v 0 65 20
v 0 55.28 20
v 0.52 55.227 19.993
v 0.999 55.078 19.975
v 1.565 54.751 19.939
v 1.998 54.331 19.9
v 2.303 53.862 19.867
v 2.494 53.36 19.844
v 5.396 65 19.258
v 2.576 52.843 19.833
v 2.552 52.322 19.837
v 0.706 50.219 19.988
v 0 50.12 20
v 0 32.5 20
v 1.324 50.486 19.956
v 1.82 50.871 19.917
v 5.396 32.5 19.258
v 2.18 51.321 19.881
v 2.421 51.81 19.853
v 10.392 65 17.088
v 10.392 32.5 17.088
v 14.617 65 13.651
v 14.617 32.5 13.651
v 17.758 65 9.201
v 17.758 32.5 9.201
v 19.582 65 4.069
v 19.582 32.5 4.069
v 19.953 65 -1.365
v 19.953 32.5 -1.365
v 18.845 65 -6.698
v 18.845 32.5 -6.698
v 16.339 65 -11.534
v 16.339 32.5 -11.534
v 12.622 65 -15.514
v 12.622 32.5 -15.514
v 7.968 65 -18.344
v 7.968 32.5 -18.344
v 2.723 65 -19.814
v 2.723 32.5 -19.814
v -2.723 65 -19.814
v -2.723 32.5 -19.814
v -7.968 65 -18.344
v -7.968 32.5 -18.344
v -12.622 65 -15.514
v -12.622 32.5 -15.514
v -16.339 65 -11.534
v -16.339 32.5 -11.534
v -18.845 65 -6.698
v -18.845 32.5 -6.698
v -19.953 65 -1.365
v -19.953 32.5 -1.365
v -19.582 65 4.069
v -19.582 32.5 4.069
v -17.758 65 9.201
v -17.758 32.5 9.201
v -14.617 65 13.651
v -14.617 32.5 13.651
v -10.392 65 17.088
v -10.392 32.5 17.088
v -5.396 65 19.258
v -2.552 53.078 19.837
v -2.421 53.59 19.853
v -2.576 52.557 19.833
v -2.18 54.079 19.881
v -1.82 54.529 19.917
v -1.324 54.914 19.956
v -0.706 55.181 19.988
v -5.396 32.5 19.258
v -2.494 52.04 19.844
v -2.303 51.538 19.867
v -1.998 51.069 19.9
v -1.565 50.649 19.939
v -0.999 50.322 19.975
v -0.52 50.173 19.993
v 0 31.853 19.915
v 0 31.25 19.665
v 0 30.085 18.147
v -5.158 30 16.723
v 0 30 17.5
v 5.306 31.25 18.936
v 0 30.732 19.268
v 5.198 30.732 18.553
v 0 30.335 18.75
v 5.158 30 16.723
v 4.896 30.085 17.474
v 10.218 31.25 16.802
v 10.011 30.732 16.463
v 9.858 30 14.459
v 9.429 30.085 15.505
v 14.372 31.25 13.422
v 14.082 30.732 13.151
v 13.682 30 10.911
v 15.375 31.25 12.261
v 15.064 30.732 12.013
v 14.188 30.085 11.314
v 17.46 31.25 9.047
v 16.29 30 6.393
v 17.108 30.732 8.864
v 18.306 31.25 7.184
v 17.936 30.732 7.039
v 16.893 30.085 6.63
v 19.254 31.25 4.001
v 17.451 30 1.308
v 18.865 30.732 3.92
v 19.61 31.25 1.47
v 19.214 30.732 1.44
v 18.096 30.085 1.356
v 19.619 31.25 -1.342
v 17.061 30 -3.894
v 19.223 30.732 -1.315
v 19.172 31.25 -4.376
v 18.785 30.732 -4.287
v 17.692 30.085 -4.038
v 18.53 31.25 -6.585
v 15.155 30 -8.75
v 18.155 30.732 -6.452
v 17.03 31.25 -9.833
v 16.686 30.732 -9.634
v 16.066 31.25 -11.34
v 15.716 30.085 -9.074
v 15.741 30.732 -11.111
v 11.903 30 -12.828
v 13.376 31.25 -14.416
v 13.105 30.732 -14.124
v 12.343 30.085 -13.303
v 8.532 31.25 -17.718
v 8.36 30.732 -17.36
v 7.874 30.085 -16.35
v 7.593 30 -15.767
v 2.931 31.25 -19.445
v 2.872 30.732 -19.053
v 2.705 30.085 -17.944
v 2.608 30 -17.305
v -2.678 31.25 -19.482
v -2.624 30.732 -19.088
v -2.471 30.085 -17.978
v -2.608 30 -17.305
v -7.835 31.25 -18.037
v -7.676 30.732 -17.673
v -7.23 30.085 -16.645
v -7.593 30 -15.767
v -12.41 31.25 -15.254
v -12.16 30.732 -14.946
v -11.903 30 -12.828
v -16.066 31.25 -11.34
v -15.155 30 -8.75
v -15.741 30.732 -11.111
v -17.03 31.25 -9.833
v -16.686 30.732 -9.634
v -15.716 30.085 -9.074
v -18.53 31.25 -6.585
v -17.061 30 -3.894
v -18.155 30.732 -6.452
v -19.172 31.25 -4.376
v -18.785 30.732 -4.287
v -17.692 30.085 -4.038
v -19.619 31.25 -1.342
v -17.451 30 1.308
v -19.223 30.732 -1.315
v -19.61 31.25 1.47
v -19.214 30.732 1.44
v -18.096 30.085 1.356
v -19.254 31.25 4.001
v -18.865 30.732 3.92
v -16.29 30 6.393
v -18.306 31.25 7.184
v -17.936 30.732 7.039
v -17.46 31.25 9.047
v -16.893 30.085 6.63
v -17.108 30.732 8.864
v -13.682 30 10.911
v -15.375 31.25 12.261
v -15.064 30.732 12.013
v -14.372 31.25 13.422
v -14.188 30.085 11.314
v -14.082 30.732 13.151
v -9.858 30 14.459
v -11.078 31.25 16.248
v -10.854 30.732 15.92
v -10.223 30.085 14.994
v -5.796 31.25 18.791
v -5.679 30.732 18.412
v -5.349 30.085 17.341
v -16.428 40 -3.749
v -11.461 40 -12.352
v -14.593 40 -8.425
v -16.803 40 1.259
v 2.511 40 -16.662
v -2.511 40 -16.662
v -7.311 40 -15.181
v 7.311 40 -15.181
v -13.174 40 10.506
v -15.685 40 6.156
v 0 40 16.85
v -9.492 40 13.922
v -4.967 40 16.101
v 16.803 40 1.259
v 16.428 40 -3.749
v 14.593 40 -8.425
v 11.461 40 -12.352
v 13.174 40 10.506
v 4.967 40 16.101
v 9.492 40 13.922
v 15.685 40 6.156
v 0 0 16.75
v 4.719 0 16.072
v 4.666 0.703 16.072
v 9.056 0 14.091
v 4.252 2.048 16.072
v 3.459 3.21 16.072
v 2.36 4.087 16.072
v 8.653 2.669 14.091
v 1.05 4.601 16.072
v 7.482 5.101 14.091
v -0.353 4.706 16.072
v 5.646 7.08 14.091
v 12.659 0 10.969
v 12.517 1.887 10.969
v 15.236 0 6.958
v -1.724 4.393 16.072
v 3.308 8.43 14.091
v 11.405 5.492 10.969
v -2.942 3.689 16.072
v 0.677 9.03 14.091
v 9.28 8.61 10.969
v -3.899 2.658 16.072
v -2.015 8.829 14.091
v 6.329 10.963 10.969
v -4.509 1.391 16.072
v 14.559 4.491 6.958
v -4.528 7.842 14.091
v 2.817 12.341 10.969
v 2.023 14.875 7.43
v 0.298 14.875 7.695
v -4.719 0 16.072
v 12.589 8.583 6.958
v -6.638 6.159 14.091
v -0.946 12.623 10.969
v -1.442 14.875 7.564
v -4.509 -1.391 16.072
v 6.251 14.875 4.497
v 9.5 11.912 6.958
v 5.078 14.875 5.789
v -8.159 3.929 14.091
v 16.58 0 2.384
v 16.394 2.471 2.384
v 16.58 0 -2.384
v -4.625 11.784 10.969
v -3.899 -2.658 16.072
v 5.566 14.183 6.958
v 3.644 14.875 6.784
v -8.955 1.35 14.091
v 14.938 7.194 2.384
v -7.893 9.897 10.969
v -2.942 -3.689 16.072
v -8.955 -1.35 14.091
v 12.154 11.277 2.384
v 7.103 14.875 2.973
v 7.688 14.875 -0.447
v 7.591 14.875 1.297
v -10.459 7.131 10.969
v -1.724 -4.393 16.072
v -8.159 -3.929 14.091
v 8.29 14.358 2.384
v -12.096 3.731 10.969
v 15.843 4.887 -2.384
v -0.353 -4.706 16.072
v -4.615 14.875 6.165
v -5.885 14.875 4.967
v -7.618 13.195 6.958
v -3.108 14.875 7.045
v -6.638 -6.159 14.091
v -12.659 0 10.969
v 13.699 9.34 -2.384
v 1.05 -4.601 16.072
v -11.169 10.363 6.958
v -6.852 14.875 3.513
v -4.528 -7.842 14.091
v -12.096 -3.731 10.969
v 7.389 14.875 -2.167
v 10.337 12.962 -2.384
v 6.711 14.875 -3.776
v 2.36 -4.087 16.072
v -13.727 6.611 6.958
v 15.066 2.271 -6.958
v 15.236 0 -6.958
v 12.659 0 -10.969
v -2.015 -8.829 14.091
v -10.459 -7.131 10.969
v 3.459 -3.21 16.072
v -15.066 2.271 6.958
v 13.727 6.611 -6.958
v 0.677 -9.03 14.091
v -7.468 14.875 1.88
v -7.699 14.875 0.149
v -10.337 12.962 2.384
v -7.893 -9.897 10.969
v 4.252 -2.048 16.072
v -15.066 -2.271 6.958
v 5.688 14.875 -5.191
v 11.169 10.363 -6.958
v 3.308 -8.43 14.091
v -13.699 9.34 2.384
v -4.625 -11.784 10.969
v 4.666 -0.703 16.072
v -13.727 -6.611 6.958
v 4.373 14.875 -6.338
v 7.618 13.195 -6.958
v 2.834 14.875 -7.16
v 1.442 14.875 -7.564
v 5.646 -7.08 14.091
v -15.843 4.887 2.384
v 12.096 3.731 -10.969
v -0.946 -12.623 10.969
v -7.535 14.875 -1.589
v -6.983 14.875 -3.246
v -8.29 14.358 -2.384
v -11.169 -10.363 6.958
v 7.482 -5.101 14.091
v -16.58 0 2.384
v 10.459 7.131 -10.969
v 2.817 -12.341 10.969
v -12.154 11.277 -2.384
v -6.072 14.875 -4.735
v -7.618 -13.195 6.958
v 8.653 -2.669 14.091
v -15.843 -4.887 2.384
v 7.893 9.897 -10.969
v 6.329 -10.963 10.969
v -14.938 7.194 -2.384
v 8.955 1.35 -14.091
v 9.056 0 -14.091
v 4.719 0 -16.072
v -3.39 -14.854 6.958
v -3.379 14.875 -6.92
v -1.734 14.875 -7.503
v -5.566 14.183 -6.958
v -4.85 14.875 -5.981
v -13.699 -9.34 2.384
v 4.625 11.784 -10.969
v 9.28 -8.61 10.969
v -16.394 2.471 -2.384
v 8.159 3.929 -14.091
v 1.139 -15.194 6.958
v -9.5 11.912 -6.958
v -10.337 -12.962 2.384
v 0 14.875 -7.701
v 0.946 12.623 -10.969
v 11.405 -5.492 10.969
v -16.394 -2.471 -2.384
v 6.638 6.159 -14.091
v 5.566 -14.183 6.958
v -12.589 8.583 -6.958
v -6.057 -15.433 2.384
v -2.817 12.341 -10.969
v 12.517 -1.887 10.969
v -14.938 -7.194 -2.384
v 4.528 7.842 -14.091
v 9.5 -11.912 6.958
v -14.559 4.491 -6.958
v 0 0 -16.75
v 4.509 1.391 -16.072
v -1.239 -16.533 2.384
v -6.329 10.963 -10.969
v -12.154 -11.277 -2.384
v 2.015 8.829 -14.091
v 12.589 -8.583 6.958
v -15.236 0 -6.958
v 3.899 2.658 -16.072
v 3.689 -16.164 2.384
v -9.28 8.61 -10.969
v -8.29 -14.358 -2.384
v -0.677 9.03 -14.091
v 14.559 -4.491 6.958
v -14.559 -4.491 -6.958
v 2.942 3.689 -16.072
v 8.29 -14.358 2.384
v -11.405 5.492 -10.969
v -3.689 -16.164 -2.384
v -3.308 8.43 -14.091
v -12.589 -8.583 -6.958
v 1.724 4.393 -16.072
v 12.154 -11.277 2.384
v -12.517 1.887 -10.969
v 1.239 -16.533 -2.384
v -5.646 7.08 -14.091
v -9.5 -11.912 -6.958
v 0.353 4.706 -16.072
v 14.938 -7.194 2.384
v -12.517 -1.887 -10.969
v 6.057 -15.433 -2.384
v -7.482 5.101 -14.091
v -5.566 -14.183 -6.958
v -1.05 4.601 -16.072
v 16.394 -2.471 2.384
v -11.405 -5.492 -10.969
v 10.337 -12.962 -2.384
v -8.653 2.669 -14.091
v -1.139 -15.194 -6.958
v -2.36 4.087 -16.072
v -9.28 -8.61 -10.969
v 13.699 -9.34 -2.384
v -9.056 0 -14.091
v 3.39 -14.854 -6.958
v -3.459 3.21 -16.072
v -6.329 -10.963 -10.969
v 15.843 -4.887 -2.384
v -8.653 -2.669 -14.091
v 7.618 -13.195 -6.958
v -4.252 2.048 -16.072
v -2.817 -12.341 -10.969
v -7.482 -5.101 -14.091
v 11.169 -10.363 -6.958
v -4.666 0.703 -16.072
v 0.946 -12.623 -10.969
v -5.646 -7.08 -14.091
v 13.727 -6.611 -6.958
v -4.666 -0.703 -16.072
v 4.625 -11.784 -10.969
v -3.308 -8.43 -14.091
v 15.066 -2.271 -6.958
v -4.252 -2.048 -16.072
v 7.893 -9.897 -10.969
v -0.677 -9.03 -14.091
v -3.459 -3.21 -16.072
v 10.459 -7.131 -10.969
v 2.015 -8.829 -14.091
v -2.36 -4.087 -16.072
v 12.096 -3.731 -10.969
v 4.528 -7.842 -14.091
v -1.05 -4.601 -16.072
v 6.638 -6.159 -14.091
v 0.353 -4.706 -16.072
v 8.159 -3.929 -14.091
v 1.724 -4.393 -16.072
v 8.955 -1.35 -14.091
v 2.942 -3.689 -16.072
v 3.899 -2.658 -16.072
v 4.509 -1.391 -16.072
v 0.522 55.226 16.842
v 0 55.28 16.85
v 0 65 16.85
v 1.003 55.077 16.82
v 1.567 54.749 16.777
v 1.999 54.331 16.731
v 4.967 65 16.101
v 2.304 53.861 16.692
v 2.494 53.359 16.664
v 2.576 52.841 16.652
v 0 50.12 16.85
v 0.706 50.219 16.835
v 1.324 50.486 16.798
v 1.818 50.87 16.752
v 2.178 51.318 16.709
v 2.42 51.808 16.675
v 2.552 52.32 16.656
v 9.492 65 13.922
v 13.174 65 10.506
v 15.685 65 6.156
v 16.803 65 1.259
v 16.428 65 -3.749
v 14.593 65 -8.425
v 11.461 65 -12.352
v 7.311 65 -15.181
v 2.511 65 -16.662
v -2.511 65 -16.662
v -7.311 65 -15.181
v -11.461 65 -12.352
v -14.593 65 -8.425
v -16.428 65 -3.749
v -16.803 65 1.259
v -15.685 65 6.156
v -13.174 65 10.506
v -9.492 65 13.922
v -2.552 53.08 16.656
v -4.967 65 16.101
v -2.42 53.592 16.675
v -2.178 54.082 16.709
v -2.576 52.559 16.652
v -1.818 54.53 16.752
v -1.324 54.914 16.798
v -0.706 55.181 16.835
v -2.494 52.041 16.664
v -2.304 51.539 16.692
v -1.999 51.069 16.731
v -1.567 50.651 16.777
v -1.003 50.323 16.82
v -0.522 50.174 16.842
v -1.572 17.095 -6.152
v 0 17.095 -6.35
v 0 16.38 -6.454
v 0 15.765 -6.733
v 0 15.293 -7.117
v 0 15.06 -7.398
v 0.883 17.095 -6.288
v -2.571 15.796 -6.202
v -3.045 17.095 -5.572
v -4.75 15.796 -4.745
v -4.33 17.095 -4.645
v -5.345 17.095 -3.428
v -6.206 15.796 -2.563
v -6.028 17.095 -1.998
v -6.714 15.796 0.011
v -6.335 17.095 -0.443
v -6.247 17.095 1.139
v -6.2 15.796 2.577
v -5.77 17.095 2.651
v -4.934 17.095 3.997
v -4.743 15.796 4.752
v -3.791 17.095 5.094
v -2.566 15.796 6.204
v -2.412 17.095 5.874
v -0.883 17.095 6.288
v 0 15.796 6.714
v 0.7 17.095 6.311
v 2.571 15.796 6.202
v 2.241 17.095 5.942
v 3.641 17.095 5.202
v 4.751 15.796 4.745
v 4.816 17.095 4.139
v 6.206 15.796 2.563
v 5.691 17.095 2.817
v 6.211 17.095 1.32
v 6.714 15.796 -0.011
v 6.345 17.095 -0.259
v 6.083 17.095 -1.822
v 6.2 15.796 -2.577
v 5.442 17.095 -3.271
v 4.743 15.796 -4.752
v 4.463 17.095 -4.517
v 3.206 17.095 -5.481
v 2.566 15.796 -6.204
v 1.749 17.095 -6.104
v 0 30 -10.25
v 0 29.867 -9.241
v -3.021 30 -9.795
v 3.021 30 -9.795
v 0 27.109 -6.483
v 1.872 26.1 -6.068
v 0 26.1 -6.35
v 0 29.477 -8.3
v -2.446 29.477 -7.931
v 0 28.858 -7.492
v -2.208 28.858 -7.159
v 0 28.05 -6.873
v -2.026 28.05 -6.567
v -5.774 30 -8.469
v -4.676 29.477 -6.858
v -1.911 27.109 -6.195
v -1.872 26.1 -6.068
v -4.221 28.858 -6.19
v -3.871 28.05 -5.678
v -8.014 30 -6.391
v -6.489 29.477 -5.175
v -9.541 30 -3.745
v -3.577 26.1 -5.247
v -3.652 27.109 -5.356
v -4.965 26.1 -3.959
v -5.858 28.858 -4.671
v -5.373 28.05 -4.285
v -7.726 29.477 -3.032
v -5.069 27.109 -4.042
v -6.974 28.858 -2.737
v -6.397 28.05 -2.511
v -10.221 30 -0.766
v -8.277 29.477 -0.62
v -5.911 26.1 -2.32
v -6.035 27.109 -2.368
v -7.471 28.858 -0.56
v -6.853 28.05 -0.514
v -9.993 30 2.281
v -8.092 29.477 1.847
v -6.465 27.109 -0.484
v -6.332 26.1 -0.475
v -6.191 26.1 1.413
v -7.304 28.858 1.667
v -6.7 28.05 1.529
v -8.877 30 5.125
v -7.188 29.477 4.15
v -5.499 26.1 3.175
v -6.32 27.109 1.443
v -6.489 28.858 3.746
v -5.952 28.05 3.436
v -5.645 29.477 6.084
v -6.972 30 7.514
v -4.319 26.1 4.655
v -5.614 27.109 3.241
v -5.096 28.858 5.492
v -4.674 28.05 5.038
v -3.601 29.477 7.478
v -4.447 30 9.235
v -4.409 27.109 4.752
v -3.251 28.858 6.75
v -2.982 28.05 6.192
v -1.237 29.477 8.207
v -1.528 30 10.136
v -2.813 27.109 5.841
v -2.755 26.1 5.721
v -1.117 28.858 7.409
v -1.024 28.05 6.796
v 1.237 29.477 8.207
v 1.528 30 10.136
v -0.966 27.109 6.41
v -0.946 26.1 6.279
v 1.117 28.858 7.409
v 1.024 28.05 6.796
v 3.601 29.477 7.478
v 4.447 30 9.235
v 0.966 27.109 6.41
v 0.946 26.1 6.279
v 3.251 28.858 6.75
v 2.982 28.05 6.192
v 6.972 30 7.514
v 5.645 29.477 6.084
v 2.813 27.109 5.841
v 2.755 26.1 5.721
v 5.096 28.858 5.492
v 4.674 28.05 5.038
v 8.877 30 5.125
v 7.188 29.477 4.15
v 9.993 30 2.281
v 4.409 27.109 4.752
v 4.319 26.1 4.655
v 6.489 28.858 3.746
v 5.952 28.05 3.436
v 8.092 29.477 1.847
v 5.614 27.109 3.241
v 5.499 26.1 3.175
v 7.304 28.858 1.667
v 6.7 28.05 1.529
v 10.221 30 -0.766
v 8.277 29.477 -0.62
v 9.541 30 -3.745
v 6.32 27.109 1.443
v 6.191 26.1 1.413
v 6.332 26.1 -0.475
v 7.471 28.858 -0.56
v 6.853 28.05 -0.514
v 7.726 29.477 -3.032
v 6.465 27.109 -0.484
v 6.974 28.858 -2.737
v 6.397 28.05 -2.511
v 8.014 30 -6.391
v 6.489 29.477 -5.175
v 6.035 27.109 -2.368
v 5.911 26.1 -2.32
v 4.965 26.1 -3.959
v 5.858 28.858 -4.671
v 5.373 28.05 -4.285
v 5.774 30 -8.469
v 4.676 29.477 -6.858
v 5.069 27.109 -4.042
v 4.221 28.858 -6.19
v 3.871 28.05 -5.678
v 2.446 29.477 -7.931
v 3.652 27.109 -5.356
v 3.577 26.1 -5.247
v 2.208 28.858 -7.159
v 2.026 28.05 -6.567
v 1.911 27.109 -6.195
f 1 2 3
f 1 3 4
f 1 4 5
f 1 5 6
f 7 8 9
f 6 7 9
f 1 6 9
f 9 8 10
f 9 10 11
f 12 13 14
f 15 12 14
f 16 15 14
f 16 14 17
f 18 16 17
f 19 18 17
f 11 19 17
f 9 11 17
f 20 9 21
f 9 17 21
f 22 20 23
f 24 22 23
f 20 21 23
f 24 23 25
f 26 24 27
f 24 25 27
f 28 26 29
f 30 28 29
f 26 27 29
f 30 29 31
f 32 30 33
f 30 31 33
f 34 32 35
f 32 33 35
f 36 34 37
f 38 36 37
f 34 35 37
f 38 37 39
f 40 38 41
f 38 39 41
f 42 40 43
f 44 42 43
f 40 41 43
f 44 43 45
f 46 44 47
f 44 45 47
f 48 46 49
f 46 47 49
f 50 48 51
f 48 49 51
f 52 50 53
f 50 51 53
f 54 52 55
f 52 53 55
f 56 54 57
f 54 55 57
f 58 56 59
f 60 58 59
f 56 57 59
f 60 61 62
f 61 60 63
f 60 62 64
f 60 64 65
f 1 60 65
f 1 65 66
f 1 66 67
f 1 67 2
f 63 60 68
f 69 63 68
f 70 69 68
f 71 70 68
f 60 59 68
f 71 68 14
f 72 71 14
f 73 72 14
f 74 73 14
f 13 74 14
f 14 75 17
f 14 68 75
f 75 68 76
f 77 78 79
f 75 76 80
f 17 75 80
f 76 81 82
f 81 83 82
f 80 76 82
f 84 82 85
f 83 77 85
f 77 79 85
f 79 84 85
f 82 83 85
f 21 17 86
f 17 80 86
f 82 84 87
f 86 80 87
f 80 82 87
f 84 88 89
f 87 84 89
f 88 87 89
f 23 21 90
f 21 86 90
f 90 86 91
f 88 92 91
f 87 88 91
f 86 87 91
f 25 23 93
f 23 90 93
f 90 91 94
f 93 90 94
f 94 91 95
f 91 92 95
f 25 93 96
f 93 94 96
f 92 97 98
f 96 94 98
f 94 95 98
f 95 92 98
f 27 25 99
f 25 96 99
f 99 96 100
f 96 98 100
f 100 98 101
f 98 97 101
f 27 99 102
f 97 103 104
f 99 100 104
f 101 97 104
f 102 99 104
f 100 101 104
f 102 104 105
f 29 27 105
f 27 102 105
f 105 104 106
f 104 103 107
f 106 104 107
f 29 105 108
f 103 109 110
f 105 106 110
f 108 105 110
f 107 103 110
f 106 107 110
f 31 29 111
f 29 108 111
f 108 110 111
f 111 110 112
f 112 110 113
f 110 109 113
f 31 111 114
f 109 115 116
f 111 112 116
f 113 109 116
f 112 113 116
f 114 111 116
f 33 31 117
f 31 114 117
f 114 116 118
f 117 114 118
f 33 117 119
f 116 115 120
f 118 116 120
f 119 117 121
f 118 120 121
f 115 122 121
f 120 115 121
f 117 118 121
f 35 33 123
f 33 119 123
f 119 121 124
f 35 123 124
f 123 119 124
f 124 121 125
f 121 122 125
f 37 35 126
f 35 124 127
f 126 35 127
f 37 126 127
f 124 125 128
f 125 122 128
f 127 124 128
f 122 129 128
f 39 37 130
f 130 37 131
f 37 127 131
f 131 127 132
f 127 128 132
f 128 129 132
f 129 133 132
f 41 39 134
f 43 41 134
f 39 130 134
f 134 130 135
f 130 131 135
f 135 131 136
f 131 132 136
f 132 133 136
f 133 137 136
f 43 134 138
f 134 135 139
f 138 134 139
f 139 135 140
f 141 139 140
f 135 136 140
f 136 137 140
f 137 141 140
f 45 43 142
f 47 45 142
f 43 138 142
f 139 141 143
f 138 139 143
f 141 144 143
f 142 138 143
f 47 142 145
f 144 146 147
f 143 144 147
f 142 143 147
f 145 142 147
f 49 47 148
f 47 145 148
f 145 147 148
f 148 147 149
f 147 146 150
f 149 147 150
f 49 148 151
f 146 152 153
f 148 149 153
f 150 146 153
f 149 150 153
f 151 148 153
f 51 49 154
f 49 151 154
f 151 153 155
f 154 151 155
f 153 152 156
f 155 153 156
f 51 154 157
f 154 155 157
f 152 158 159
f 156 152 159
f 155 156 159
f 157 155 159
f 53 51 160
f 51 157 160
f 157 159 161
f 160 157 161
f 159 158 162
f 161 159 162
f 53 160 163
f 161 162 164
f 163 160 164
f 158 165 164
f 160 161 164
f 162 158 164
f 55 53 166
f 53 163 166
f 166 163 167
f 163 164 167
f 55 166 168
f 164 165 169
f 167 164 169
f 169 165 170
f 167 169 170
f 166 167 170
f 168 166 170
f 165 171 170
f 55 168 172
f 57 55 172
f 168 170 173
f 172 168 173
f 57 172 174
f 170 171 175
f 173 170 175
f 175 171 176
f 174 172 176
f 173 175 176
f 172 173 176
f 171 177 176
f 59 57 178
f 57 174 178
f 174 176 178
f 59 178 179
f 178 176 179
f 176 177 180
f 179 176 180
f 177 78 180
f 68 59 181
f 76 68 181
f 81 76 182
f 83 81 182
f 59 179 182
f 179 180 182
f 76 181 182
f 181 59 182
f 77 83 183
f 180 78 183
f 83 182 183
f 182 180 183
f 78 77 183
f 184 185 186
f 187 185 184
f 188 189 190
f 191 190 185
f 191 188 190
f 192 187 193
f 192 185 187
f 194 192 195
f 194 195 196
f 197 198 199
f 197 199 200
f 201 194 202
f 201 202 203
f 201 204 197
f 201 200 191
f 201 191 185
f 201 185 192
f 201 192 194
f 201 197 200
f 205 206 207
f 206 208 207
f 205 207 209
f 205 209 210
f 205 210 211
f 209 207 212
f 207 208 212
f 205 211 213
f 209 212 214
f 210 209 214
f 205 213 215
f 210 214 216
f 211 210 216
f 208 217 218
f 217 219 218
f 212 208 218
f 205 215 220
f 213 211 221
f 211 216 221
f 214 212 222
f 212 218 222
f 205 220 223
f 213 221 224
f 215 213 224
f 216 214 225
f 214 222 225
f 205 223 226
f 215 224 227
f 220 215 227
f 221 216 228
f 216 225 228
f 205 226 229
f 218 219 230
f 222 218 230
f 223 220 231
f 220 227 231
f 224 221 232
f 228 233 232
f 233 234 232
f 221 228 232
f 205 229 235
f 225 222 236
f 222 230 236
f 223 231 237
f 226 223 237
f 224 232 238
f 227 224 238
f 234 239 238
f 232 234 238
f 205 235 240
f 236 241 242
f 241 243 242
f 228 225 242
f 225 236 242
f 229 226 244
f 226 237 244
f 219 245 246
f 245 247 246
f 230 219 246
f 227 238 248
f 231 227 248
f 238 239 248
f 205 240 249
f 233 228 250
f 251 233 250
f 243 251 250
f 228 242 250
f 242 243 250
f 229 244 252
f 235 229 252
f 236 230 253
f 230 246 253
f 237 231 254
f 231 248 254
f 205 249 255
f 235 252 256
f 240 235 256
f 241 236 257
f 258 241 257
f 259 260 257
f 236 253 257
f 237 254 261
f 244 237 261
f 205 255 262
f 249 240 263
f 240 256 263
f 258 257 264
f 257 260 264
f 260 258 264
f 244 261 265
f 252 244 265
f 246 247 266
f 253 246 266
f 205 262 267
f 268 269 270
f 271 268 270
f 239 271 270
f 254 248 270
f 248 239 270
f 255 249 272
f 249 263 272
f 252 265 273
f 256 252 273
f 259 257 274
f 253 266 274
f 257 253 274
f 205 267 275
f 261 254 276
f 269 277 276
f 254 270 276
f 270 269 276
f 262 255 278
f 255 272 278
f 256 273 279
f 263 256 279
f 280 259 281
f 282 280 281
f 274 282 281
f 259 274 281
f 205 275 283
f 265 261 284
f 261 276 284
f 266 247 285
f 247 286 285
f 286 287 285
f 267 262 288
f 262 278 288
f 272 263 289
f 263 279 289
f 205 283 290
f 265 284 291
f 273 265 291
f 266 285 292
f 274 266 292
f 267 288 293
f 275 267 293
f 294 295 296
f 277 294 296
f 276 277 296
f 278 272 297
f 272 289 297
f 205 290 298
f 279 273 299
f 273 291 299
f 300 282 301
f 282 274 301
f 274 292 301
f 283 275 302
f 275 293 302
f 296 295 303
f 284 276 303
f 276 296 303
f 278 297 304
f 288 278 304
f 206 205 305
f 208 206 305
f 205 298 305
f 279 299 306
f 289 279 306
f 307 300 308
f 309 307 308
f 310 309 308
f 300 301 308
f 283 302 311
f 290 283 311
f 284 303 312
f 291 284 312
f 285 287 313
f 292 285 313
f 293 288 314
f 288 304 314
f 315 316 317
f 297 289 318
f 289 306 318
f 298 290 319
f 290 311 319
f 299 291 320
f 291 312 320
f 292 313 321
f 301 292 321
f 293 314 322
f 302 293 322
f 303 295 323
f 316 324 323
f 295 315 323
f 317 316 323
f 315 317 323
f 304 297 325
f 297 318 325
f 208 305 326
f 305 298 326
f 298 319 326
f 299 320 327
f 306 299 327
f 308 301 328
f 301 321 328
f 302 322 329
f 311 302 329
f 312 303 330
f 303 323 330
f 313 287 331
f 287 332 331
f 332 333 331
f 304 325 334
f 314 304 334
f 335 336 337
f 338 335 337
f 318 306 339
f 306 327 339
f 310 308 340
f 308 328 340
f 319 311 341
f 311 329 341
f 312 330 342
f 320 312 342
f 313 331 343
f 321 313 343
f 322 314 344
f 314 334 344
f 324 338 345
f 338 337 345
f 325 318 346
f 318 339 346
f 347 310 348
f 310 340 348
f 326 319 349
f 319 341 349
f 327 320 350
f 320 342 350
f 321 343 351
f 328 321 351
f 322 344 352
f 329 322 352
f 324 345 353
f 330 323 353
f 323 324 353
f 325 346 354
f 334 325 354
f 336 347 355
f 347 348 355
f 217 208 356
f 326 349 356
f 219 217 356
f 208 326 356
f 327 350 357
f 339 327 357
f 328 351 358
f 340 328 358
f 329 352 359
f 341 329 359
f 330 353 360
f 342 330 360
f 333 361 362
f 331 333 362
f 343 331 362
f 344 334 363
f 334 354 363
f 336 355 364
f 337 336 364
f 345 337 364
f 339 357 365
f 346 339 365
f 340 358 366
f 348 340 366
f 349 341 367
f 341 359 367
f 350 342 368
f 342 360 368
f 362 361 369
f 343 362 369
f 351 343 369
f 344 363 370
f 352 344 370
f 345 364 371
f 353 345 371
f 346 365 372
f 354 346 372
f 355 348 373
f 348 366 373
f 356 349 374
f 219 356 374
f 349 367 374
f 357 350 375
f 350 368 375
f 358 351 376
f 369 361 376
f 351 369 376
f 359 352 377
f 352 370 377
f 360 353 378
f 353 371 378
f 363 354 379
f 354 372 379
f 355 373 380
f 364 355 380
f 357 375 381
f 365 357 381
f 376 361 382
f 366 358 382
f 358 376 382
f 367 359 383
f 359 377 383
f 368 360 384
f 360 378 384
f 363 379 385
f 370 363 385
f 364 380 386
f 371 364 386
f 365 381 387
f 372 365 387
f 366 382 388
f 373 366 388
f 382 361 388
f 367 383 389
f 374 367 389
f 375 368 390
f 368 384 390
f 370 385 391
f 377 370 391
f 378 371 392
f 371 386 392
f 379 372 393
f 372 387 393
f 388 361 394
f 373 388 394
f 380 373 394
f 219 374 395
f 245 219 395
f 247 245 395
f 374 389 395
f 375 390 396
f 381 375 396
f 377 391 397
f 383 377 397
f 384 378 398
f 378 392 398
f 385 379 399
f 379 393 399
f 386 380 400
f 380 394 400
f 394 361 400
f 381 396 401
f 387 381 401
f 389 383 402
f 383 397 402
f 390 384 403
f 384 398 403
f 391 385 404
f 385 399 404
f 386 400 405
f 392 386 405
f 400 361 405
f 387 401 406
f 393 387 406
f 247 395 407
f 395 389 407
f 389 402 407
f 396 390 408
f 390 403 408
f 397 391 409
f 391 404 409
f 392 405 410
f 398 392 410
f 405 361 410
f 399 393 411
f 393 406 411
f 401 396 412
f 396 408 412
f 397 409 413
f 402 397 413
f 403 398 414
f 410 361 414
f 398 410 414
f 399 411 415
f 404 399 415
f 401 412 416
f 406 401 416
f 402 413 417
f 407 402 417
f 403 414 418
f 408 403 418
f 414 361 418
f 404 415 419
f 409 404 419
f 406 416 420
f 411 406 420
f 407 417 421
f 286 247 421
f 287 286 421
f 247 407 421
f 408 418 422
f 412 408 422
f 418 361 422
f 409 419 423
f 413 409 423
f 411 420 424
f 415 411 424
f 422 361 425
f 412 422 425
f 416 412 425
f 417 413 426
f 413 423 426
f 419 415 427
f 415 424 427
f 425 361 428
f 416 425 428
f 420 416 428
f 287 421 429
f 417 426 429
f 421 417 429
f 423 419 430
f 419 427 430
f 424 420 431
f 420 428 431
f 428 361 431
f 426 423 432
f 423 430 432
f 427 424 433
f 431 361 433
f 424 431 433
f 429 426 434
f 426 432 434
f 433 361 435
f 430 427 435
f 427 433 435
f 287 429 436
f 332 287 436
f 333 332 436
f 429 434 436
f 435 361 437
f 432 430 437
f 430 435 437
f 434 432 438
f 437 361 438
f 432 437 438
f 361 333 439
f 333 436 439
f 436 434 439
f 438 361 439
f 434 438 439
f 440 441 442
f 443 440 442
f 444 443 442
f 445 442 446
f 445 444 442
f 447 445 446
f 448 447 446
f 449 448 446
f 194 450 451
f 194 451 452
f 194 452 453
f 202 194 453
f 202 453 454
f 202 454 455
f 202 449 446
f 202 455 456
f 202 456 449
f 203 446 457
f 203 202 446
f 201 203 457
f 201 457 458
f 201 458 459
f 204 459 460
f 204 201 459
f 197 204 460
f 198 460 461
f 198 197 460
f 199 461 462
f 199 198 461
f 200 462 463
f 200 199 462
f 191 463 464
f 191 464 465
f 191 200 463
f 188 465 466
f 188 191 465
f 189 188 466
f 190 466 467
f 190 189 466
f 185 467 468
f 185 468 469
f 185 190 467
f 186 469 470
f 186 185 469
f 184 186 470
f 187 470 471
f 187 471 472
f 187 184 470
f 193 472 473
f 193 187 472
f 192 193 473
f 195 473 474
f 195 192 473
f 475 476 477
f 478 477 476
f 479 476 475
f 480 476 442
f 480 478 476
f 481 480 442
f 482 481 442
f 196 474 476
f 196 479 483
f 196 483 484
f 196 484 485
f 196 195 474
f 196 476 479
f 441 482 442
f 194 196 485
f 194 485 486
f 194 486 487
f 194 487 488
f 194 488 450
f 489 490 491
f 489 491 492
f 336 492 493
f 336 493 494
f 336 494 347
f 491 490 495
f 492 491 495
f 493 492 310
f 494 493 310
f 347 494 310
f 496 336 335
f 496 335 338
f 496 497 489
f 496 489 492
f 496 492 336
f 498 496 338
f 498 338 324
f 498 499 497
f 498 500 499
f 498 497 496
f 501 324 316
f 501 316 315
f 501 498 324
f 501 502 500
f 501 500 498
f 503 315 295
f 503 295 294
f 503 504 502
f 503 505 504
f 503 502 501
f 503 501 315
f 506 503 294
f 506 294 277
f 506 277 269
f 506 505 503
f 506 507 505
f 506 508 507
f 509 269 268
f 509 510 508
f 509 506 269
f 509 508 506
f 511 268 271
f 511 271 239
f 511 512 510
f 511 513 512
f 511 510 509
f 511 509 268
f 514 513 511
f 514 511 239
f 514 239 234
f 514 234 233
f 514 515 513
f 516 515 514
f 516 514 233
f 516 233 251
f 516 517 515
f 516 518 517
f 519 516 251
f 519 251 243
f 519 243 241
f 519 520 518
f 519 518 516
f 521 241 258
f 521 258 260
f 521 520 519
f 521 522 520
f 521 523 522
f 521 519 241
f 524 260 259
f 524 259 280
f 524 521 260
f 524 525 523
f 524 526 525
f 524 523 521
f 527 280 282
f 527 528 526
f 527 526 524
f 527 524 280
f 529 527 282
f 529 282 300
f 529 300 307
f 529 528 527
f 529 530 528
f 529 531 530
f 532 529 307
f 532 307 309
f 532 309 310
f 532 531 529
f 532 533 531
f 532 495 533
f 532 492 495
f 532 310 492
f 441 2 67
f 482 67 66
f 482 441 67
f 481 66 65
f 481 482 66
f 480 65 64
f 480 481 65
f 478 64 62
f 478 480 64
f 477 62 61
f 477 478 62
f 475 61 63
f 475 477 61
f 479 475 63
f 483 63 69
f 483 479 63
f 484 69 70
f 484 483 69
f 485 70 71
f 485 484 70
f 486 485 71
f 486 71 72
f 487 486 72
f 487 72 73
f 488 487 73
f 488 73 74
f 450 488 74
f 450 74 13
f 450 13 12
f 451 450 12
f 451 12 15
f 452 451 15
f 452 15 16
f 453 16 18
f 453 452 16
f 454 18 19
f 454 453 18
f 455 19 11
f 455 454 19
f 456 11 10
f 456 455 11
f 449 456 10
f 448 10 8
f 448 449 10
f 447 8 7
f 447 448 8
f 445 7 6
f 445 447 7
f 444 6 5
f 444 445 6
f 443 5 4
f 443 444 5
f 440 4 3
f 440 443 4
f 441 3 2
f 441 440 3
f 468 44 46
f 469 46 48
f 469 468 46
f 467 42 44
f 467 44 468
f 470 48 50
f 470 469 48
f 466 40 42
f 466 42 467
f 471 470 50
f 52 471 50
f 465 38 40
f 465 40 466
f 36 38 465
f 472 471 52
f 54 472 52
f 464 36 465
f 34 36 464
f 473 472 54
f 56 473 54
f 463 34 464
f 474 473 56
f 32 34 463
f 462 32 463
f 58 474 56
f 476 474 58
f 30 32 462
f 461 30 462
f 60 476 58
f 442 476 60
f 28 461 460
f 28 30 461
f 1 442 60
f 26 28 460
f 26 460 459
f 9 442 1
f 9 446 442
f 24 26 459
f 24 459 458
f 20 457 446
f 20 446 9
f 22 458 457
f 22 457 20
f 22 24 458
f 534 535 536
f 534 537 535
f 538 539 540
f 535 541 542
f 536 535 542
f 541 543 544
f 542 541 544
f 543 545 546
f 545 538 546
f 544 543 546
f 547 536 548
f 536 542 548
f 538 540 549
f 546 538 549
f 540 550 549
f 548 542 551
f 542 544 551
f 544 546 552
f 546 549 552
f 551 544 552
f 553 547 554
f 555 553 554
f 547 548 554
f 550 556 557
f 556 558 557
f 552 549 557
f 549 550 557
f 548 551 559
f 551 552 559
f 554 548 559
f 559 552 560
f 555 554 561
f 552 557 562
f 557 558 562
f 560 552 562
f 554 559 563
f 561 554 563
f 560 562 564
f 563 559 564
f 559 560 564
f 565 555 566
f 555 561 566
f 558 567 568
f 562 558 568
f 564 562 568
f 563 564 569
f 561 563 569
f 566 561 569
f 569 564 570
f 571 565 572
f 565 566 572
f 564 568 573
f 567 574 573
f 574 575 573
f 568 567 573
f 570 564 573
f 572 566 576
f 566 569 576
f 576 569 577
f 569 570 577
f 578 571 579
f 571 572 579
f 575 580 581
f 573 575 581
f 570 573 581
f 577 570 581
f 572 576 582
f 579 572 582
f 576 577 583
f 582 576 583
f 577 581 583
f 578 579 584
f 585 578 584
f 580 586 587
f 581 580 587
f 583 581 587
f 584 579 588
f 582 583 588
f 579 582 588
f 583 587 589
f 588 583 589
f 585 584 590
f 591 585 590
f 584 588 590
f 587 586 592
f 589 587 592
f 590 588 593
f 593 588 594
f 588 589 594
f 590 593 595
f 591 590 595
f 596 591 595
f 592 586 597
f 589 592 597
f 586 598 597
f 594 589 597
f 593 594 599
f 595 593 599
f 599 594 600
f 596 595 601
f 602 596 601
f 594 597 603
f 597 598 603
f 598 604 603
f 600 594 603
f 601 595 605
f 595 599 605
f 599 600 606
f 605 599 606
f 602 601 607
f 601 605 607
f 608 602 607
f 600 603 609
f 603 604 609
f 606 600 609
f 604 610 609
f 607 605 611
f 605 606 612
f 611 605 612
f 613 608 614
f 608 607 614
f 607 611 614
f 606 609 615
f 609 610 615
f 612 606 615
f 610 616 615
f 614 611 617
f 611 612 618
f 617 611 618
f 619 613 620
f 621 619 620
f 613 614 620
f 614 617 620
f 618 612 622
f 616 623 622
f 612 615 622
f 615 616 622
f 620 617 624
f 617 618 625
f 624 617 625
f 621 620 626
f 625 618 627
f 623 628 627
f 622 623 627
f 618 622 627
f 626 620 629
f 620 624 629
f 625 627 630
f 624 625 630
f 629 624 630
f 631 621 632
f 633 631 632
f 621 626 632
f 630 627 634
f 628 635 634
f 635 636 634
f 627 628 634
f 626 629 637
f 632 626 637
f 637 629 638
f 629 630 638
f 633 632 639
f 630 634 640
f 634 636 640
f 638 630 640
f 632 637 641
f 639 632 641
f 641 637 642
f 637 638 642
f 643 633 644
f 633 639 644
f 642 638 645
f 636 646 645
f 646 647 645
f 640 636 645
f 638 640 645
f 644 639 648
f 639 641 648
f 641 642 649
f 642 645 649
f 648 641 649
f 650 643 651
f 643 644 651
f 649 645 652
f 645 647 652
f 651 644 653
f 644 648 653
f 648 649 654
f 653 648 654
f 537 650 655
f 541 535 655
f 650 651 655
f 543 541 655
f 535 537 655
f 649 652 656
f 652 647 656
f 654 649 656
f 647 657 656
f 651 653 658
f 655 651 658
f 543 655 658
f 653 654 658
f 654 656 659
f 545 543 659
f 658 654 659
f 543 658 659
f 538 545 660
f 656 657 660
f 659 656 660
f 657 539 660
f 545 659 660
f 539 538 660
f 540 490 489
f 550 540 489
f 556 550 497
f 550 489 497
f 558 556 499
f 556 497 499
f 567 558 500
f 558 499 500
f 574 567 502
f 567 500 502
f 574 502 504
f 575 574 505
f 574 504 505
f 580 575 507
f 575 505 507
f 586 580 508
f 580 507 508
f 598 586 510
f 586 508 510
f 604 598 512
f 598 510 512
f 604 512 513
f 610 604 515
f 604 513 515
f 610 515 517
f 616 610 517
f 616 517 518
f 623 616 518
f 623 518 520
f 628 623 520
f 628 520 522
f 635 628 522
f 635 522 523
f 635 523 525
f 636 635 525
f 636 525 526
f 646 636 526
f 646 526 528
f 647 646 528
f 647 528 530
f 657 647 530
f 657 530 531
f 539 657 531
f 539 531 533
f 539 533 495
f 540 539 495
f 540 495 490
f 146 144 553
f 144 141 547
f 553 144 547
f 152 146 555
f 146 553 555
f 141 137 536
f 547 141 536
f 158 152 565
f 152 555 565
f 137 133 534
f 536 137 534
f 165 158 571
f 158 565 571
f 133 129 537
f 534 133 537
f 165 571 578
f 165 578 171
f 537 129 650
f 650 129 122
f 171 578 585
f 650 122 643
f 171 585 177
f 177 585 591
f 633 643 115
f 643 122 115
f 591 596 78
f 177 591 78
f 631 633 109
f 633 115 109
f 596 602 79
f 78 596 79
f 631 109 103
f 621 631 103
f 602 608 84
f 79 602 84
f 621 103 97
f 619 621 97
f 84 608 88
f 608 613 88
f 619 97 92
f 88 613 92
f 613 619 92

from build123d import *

# Parameters (mm, degrees)
SKETCH2_R           = 6.35
BOSS_EXTRUDE1_DEPTH = 30
SKETCH3_R           = 20
BOSS_EXTRUDE3_DEPTH = 10
FILLET1_R           = 3.9
SKETCH4_R           = 20
SKETCH4_R_2         = 16.85
BOSS_EXTRUDE4_DEPTH = 25
FILLET2_R           = 2.5
FILLET3_R           = 2.5
SKETCH5_R           = 2.5796875
CUT_EXTRUDE1_DEPTH  = 71.887234394


with BuildPart() as part:
    # Sketch1 → Revolve3 (revolve)
    with BuildSketch(Plane(origin=(0, 0, 0), x_dir=(1, 0, 0), z_dir=(0, 1, 0))):
        with BuildLine():
            Line((0, 16.75), (0, -16.75))
            ThreePointArc((0, -16.75), (16.75, 0), (0, 16.75))
        make_face()
    revolve(axis=Axis((0, 0, -16.75), (0, 0, 1)))

    # Sketch2 → Boss-Extrude1 (add)
    with BuildSketch(Plane(origin=(0, 0, 0), x_dir=(1, 0, 0), z_dir=(0, 1, 0))):
        with Locations(Location((0, 0, 0), (0, 0, 90))):
            Circle(SKETCH2_R)
    extrude(amount=BOSS_EXTRUDE1_DEPTH)

    # Sketch3 → Boss-Extrude3 (add)
    with BuildSketch(Plane(origin=(0, 30, 0), x_dir=(1, 0, 0), z_dir=(0, 1, 0))):
        with Locations(Location((0, 0, 0), (0, 0, 270))):
            Circle(SKETCH3_R)
    extrude(amount=BOSS_EXTRUDE3_DEPTH)

    # Fillet1
    fillet1_edges = [part.edges().sort_by_distance(p)[0] for p in [
        (0, 30, 6.35),
    ]]
    fillet(fillet1_edges, radius=FILLET1_R)

    # Sketch4 → Boss-Extrude4 (add)
    with BuildSketch(Plane(origin=(0, 40, 0), x_dir=(1, 0, 0), z_dir=(0, 1, 0))):
        with Locations(Location((0, 0, 0), (0, 0, 270))):
            Circle(SKETCH4_R)
        with Locations(Location((0, 0, 0), (0, 0, 270))):
            Circle(SKETCH4_R_2, mode=Mode.SUBTRACT)
    extrude(amount=BOSS_EXTRUDE4_DEPTH)

    # Fillet2
    fillet2_edges = [part.edges().sort_by_distance(p)[0] for p in [
        (0, 30, -20),
    ]]
    fillet(fillet2_edges, radius=FILLET2_R)

    # Fillet3
    fillet3_edges = [part.edges().sort_by_distance(p)[0] for p in [
        (0, 15.499677416, 6.35),
    ]]
    fillet(fillet3_edges, radius=FILLET3_R)

    # Sketch5 → Cut-Extrude1 (cut, through all)
    with BuildSketch(Plane.XY):
        with Locations(Location((0, 52.7, 0), (0, 0, 90.000000055))):
            Circle(SKETCH5_R)
    extrude(amount=CUT_EXTRUDE1_DEPTH, mode=Mode.SUBTRACT)


solid = part.part
